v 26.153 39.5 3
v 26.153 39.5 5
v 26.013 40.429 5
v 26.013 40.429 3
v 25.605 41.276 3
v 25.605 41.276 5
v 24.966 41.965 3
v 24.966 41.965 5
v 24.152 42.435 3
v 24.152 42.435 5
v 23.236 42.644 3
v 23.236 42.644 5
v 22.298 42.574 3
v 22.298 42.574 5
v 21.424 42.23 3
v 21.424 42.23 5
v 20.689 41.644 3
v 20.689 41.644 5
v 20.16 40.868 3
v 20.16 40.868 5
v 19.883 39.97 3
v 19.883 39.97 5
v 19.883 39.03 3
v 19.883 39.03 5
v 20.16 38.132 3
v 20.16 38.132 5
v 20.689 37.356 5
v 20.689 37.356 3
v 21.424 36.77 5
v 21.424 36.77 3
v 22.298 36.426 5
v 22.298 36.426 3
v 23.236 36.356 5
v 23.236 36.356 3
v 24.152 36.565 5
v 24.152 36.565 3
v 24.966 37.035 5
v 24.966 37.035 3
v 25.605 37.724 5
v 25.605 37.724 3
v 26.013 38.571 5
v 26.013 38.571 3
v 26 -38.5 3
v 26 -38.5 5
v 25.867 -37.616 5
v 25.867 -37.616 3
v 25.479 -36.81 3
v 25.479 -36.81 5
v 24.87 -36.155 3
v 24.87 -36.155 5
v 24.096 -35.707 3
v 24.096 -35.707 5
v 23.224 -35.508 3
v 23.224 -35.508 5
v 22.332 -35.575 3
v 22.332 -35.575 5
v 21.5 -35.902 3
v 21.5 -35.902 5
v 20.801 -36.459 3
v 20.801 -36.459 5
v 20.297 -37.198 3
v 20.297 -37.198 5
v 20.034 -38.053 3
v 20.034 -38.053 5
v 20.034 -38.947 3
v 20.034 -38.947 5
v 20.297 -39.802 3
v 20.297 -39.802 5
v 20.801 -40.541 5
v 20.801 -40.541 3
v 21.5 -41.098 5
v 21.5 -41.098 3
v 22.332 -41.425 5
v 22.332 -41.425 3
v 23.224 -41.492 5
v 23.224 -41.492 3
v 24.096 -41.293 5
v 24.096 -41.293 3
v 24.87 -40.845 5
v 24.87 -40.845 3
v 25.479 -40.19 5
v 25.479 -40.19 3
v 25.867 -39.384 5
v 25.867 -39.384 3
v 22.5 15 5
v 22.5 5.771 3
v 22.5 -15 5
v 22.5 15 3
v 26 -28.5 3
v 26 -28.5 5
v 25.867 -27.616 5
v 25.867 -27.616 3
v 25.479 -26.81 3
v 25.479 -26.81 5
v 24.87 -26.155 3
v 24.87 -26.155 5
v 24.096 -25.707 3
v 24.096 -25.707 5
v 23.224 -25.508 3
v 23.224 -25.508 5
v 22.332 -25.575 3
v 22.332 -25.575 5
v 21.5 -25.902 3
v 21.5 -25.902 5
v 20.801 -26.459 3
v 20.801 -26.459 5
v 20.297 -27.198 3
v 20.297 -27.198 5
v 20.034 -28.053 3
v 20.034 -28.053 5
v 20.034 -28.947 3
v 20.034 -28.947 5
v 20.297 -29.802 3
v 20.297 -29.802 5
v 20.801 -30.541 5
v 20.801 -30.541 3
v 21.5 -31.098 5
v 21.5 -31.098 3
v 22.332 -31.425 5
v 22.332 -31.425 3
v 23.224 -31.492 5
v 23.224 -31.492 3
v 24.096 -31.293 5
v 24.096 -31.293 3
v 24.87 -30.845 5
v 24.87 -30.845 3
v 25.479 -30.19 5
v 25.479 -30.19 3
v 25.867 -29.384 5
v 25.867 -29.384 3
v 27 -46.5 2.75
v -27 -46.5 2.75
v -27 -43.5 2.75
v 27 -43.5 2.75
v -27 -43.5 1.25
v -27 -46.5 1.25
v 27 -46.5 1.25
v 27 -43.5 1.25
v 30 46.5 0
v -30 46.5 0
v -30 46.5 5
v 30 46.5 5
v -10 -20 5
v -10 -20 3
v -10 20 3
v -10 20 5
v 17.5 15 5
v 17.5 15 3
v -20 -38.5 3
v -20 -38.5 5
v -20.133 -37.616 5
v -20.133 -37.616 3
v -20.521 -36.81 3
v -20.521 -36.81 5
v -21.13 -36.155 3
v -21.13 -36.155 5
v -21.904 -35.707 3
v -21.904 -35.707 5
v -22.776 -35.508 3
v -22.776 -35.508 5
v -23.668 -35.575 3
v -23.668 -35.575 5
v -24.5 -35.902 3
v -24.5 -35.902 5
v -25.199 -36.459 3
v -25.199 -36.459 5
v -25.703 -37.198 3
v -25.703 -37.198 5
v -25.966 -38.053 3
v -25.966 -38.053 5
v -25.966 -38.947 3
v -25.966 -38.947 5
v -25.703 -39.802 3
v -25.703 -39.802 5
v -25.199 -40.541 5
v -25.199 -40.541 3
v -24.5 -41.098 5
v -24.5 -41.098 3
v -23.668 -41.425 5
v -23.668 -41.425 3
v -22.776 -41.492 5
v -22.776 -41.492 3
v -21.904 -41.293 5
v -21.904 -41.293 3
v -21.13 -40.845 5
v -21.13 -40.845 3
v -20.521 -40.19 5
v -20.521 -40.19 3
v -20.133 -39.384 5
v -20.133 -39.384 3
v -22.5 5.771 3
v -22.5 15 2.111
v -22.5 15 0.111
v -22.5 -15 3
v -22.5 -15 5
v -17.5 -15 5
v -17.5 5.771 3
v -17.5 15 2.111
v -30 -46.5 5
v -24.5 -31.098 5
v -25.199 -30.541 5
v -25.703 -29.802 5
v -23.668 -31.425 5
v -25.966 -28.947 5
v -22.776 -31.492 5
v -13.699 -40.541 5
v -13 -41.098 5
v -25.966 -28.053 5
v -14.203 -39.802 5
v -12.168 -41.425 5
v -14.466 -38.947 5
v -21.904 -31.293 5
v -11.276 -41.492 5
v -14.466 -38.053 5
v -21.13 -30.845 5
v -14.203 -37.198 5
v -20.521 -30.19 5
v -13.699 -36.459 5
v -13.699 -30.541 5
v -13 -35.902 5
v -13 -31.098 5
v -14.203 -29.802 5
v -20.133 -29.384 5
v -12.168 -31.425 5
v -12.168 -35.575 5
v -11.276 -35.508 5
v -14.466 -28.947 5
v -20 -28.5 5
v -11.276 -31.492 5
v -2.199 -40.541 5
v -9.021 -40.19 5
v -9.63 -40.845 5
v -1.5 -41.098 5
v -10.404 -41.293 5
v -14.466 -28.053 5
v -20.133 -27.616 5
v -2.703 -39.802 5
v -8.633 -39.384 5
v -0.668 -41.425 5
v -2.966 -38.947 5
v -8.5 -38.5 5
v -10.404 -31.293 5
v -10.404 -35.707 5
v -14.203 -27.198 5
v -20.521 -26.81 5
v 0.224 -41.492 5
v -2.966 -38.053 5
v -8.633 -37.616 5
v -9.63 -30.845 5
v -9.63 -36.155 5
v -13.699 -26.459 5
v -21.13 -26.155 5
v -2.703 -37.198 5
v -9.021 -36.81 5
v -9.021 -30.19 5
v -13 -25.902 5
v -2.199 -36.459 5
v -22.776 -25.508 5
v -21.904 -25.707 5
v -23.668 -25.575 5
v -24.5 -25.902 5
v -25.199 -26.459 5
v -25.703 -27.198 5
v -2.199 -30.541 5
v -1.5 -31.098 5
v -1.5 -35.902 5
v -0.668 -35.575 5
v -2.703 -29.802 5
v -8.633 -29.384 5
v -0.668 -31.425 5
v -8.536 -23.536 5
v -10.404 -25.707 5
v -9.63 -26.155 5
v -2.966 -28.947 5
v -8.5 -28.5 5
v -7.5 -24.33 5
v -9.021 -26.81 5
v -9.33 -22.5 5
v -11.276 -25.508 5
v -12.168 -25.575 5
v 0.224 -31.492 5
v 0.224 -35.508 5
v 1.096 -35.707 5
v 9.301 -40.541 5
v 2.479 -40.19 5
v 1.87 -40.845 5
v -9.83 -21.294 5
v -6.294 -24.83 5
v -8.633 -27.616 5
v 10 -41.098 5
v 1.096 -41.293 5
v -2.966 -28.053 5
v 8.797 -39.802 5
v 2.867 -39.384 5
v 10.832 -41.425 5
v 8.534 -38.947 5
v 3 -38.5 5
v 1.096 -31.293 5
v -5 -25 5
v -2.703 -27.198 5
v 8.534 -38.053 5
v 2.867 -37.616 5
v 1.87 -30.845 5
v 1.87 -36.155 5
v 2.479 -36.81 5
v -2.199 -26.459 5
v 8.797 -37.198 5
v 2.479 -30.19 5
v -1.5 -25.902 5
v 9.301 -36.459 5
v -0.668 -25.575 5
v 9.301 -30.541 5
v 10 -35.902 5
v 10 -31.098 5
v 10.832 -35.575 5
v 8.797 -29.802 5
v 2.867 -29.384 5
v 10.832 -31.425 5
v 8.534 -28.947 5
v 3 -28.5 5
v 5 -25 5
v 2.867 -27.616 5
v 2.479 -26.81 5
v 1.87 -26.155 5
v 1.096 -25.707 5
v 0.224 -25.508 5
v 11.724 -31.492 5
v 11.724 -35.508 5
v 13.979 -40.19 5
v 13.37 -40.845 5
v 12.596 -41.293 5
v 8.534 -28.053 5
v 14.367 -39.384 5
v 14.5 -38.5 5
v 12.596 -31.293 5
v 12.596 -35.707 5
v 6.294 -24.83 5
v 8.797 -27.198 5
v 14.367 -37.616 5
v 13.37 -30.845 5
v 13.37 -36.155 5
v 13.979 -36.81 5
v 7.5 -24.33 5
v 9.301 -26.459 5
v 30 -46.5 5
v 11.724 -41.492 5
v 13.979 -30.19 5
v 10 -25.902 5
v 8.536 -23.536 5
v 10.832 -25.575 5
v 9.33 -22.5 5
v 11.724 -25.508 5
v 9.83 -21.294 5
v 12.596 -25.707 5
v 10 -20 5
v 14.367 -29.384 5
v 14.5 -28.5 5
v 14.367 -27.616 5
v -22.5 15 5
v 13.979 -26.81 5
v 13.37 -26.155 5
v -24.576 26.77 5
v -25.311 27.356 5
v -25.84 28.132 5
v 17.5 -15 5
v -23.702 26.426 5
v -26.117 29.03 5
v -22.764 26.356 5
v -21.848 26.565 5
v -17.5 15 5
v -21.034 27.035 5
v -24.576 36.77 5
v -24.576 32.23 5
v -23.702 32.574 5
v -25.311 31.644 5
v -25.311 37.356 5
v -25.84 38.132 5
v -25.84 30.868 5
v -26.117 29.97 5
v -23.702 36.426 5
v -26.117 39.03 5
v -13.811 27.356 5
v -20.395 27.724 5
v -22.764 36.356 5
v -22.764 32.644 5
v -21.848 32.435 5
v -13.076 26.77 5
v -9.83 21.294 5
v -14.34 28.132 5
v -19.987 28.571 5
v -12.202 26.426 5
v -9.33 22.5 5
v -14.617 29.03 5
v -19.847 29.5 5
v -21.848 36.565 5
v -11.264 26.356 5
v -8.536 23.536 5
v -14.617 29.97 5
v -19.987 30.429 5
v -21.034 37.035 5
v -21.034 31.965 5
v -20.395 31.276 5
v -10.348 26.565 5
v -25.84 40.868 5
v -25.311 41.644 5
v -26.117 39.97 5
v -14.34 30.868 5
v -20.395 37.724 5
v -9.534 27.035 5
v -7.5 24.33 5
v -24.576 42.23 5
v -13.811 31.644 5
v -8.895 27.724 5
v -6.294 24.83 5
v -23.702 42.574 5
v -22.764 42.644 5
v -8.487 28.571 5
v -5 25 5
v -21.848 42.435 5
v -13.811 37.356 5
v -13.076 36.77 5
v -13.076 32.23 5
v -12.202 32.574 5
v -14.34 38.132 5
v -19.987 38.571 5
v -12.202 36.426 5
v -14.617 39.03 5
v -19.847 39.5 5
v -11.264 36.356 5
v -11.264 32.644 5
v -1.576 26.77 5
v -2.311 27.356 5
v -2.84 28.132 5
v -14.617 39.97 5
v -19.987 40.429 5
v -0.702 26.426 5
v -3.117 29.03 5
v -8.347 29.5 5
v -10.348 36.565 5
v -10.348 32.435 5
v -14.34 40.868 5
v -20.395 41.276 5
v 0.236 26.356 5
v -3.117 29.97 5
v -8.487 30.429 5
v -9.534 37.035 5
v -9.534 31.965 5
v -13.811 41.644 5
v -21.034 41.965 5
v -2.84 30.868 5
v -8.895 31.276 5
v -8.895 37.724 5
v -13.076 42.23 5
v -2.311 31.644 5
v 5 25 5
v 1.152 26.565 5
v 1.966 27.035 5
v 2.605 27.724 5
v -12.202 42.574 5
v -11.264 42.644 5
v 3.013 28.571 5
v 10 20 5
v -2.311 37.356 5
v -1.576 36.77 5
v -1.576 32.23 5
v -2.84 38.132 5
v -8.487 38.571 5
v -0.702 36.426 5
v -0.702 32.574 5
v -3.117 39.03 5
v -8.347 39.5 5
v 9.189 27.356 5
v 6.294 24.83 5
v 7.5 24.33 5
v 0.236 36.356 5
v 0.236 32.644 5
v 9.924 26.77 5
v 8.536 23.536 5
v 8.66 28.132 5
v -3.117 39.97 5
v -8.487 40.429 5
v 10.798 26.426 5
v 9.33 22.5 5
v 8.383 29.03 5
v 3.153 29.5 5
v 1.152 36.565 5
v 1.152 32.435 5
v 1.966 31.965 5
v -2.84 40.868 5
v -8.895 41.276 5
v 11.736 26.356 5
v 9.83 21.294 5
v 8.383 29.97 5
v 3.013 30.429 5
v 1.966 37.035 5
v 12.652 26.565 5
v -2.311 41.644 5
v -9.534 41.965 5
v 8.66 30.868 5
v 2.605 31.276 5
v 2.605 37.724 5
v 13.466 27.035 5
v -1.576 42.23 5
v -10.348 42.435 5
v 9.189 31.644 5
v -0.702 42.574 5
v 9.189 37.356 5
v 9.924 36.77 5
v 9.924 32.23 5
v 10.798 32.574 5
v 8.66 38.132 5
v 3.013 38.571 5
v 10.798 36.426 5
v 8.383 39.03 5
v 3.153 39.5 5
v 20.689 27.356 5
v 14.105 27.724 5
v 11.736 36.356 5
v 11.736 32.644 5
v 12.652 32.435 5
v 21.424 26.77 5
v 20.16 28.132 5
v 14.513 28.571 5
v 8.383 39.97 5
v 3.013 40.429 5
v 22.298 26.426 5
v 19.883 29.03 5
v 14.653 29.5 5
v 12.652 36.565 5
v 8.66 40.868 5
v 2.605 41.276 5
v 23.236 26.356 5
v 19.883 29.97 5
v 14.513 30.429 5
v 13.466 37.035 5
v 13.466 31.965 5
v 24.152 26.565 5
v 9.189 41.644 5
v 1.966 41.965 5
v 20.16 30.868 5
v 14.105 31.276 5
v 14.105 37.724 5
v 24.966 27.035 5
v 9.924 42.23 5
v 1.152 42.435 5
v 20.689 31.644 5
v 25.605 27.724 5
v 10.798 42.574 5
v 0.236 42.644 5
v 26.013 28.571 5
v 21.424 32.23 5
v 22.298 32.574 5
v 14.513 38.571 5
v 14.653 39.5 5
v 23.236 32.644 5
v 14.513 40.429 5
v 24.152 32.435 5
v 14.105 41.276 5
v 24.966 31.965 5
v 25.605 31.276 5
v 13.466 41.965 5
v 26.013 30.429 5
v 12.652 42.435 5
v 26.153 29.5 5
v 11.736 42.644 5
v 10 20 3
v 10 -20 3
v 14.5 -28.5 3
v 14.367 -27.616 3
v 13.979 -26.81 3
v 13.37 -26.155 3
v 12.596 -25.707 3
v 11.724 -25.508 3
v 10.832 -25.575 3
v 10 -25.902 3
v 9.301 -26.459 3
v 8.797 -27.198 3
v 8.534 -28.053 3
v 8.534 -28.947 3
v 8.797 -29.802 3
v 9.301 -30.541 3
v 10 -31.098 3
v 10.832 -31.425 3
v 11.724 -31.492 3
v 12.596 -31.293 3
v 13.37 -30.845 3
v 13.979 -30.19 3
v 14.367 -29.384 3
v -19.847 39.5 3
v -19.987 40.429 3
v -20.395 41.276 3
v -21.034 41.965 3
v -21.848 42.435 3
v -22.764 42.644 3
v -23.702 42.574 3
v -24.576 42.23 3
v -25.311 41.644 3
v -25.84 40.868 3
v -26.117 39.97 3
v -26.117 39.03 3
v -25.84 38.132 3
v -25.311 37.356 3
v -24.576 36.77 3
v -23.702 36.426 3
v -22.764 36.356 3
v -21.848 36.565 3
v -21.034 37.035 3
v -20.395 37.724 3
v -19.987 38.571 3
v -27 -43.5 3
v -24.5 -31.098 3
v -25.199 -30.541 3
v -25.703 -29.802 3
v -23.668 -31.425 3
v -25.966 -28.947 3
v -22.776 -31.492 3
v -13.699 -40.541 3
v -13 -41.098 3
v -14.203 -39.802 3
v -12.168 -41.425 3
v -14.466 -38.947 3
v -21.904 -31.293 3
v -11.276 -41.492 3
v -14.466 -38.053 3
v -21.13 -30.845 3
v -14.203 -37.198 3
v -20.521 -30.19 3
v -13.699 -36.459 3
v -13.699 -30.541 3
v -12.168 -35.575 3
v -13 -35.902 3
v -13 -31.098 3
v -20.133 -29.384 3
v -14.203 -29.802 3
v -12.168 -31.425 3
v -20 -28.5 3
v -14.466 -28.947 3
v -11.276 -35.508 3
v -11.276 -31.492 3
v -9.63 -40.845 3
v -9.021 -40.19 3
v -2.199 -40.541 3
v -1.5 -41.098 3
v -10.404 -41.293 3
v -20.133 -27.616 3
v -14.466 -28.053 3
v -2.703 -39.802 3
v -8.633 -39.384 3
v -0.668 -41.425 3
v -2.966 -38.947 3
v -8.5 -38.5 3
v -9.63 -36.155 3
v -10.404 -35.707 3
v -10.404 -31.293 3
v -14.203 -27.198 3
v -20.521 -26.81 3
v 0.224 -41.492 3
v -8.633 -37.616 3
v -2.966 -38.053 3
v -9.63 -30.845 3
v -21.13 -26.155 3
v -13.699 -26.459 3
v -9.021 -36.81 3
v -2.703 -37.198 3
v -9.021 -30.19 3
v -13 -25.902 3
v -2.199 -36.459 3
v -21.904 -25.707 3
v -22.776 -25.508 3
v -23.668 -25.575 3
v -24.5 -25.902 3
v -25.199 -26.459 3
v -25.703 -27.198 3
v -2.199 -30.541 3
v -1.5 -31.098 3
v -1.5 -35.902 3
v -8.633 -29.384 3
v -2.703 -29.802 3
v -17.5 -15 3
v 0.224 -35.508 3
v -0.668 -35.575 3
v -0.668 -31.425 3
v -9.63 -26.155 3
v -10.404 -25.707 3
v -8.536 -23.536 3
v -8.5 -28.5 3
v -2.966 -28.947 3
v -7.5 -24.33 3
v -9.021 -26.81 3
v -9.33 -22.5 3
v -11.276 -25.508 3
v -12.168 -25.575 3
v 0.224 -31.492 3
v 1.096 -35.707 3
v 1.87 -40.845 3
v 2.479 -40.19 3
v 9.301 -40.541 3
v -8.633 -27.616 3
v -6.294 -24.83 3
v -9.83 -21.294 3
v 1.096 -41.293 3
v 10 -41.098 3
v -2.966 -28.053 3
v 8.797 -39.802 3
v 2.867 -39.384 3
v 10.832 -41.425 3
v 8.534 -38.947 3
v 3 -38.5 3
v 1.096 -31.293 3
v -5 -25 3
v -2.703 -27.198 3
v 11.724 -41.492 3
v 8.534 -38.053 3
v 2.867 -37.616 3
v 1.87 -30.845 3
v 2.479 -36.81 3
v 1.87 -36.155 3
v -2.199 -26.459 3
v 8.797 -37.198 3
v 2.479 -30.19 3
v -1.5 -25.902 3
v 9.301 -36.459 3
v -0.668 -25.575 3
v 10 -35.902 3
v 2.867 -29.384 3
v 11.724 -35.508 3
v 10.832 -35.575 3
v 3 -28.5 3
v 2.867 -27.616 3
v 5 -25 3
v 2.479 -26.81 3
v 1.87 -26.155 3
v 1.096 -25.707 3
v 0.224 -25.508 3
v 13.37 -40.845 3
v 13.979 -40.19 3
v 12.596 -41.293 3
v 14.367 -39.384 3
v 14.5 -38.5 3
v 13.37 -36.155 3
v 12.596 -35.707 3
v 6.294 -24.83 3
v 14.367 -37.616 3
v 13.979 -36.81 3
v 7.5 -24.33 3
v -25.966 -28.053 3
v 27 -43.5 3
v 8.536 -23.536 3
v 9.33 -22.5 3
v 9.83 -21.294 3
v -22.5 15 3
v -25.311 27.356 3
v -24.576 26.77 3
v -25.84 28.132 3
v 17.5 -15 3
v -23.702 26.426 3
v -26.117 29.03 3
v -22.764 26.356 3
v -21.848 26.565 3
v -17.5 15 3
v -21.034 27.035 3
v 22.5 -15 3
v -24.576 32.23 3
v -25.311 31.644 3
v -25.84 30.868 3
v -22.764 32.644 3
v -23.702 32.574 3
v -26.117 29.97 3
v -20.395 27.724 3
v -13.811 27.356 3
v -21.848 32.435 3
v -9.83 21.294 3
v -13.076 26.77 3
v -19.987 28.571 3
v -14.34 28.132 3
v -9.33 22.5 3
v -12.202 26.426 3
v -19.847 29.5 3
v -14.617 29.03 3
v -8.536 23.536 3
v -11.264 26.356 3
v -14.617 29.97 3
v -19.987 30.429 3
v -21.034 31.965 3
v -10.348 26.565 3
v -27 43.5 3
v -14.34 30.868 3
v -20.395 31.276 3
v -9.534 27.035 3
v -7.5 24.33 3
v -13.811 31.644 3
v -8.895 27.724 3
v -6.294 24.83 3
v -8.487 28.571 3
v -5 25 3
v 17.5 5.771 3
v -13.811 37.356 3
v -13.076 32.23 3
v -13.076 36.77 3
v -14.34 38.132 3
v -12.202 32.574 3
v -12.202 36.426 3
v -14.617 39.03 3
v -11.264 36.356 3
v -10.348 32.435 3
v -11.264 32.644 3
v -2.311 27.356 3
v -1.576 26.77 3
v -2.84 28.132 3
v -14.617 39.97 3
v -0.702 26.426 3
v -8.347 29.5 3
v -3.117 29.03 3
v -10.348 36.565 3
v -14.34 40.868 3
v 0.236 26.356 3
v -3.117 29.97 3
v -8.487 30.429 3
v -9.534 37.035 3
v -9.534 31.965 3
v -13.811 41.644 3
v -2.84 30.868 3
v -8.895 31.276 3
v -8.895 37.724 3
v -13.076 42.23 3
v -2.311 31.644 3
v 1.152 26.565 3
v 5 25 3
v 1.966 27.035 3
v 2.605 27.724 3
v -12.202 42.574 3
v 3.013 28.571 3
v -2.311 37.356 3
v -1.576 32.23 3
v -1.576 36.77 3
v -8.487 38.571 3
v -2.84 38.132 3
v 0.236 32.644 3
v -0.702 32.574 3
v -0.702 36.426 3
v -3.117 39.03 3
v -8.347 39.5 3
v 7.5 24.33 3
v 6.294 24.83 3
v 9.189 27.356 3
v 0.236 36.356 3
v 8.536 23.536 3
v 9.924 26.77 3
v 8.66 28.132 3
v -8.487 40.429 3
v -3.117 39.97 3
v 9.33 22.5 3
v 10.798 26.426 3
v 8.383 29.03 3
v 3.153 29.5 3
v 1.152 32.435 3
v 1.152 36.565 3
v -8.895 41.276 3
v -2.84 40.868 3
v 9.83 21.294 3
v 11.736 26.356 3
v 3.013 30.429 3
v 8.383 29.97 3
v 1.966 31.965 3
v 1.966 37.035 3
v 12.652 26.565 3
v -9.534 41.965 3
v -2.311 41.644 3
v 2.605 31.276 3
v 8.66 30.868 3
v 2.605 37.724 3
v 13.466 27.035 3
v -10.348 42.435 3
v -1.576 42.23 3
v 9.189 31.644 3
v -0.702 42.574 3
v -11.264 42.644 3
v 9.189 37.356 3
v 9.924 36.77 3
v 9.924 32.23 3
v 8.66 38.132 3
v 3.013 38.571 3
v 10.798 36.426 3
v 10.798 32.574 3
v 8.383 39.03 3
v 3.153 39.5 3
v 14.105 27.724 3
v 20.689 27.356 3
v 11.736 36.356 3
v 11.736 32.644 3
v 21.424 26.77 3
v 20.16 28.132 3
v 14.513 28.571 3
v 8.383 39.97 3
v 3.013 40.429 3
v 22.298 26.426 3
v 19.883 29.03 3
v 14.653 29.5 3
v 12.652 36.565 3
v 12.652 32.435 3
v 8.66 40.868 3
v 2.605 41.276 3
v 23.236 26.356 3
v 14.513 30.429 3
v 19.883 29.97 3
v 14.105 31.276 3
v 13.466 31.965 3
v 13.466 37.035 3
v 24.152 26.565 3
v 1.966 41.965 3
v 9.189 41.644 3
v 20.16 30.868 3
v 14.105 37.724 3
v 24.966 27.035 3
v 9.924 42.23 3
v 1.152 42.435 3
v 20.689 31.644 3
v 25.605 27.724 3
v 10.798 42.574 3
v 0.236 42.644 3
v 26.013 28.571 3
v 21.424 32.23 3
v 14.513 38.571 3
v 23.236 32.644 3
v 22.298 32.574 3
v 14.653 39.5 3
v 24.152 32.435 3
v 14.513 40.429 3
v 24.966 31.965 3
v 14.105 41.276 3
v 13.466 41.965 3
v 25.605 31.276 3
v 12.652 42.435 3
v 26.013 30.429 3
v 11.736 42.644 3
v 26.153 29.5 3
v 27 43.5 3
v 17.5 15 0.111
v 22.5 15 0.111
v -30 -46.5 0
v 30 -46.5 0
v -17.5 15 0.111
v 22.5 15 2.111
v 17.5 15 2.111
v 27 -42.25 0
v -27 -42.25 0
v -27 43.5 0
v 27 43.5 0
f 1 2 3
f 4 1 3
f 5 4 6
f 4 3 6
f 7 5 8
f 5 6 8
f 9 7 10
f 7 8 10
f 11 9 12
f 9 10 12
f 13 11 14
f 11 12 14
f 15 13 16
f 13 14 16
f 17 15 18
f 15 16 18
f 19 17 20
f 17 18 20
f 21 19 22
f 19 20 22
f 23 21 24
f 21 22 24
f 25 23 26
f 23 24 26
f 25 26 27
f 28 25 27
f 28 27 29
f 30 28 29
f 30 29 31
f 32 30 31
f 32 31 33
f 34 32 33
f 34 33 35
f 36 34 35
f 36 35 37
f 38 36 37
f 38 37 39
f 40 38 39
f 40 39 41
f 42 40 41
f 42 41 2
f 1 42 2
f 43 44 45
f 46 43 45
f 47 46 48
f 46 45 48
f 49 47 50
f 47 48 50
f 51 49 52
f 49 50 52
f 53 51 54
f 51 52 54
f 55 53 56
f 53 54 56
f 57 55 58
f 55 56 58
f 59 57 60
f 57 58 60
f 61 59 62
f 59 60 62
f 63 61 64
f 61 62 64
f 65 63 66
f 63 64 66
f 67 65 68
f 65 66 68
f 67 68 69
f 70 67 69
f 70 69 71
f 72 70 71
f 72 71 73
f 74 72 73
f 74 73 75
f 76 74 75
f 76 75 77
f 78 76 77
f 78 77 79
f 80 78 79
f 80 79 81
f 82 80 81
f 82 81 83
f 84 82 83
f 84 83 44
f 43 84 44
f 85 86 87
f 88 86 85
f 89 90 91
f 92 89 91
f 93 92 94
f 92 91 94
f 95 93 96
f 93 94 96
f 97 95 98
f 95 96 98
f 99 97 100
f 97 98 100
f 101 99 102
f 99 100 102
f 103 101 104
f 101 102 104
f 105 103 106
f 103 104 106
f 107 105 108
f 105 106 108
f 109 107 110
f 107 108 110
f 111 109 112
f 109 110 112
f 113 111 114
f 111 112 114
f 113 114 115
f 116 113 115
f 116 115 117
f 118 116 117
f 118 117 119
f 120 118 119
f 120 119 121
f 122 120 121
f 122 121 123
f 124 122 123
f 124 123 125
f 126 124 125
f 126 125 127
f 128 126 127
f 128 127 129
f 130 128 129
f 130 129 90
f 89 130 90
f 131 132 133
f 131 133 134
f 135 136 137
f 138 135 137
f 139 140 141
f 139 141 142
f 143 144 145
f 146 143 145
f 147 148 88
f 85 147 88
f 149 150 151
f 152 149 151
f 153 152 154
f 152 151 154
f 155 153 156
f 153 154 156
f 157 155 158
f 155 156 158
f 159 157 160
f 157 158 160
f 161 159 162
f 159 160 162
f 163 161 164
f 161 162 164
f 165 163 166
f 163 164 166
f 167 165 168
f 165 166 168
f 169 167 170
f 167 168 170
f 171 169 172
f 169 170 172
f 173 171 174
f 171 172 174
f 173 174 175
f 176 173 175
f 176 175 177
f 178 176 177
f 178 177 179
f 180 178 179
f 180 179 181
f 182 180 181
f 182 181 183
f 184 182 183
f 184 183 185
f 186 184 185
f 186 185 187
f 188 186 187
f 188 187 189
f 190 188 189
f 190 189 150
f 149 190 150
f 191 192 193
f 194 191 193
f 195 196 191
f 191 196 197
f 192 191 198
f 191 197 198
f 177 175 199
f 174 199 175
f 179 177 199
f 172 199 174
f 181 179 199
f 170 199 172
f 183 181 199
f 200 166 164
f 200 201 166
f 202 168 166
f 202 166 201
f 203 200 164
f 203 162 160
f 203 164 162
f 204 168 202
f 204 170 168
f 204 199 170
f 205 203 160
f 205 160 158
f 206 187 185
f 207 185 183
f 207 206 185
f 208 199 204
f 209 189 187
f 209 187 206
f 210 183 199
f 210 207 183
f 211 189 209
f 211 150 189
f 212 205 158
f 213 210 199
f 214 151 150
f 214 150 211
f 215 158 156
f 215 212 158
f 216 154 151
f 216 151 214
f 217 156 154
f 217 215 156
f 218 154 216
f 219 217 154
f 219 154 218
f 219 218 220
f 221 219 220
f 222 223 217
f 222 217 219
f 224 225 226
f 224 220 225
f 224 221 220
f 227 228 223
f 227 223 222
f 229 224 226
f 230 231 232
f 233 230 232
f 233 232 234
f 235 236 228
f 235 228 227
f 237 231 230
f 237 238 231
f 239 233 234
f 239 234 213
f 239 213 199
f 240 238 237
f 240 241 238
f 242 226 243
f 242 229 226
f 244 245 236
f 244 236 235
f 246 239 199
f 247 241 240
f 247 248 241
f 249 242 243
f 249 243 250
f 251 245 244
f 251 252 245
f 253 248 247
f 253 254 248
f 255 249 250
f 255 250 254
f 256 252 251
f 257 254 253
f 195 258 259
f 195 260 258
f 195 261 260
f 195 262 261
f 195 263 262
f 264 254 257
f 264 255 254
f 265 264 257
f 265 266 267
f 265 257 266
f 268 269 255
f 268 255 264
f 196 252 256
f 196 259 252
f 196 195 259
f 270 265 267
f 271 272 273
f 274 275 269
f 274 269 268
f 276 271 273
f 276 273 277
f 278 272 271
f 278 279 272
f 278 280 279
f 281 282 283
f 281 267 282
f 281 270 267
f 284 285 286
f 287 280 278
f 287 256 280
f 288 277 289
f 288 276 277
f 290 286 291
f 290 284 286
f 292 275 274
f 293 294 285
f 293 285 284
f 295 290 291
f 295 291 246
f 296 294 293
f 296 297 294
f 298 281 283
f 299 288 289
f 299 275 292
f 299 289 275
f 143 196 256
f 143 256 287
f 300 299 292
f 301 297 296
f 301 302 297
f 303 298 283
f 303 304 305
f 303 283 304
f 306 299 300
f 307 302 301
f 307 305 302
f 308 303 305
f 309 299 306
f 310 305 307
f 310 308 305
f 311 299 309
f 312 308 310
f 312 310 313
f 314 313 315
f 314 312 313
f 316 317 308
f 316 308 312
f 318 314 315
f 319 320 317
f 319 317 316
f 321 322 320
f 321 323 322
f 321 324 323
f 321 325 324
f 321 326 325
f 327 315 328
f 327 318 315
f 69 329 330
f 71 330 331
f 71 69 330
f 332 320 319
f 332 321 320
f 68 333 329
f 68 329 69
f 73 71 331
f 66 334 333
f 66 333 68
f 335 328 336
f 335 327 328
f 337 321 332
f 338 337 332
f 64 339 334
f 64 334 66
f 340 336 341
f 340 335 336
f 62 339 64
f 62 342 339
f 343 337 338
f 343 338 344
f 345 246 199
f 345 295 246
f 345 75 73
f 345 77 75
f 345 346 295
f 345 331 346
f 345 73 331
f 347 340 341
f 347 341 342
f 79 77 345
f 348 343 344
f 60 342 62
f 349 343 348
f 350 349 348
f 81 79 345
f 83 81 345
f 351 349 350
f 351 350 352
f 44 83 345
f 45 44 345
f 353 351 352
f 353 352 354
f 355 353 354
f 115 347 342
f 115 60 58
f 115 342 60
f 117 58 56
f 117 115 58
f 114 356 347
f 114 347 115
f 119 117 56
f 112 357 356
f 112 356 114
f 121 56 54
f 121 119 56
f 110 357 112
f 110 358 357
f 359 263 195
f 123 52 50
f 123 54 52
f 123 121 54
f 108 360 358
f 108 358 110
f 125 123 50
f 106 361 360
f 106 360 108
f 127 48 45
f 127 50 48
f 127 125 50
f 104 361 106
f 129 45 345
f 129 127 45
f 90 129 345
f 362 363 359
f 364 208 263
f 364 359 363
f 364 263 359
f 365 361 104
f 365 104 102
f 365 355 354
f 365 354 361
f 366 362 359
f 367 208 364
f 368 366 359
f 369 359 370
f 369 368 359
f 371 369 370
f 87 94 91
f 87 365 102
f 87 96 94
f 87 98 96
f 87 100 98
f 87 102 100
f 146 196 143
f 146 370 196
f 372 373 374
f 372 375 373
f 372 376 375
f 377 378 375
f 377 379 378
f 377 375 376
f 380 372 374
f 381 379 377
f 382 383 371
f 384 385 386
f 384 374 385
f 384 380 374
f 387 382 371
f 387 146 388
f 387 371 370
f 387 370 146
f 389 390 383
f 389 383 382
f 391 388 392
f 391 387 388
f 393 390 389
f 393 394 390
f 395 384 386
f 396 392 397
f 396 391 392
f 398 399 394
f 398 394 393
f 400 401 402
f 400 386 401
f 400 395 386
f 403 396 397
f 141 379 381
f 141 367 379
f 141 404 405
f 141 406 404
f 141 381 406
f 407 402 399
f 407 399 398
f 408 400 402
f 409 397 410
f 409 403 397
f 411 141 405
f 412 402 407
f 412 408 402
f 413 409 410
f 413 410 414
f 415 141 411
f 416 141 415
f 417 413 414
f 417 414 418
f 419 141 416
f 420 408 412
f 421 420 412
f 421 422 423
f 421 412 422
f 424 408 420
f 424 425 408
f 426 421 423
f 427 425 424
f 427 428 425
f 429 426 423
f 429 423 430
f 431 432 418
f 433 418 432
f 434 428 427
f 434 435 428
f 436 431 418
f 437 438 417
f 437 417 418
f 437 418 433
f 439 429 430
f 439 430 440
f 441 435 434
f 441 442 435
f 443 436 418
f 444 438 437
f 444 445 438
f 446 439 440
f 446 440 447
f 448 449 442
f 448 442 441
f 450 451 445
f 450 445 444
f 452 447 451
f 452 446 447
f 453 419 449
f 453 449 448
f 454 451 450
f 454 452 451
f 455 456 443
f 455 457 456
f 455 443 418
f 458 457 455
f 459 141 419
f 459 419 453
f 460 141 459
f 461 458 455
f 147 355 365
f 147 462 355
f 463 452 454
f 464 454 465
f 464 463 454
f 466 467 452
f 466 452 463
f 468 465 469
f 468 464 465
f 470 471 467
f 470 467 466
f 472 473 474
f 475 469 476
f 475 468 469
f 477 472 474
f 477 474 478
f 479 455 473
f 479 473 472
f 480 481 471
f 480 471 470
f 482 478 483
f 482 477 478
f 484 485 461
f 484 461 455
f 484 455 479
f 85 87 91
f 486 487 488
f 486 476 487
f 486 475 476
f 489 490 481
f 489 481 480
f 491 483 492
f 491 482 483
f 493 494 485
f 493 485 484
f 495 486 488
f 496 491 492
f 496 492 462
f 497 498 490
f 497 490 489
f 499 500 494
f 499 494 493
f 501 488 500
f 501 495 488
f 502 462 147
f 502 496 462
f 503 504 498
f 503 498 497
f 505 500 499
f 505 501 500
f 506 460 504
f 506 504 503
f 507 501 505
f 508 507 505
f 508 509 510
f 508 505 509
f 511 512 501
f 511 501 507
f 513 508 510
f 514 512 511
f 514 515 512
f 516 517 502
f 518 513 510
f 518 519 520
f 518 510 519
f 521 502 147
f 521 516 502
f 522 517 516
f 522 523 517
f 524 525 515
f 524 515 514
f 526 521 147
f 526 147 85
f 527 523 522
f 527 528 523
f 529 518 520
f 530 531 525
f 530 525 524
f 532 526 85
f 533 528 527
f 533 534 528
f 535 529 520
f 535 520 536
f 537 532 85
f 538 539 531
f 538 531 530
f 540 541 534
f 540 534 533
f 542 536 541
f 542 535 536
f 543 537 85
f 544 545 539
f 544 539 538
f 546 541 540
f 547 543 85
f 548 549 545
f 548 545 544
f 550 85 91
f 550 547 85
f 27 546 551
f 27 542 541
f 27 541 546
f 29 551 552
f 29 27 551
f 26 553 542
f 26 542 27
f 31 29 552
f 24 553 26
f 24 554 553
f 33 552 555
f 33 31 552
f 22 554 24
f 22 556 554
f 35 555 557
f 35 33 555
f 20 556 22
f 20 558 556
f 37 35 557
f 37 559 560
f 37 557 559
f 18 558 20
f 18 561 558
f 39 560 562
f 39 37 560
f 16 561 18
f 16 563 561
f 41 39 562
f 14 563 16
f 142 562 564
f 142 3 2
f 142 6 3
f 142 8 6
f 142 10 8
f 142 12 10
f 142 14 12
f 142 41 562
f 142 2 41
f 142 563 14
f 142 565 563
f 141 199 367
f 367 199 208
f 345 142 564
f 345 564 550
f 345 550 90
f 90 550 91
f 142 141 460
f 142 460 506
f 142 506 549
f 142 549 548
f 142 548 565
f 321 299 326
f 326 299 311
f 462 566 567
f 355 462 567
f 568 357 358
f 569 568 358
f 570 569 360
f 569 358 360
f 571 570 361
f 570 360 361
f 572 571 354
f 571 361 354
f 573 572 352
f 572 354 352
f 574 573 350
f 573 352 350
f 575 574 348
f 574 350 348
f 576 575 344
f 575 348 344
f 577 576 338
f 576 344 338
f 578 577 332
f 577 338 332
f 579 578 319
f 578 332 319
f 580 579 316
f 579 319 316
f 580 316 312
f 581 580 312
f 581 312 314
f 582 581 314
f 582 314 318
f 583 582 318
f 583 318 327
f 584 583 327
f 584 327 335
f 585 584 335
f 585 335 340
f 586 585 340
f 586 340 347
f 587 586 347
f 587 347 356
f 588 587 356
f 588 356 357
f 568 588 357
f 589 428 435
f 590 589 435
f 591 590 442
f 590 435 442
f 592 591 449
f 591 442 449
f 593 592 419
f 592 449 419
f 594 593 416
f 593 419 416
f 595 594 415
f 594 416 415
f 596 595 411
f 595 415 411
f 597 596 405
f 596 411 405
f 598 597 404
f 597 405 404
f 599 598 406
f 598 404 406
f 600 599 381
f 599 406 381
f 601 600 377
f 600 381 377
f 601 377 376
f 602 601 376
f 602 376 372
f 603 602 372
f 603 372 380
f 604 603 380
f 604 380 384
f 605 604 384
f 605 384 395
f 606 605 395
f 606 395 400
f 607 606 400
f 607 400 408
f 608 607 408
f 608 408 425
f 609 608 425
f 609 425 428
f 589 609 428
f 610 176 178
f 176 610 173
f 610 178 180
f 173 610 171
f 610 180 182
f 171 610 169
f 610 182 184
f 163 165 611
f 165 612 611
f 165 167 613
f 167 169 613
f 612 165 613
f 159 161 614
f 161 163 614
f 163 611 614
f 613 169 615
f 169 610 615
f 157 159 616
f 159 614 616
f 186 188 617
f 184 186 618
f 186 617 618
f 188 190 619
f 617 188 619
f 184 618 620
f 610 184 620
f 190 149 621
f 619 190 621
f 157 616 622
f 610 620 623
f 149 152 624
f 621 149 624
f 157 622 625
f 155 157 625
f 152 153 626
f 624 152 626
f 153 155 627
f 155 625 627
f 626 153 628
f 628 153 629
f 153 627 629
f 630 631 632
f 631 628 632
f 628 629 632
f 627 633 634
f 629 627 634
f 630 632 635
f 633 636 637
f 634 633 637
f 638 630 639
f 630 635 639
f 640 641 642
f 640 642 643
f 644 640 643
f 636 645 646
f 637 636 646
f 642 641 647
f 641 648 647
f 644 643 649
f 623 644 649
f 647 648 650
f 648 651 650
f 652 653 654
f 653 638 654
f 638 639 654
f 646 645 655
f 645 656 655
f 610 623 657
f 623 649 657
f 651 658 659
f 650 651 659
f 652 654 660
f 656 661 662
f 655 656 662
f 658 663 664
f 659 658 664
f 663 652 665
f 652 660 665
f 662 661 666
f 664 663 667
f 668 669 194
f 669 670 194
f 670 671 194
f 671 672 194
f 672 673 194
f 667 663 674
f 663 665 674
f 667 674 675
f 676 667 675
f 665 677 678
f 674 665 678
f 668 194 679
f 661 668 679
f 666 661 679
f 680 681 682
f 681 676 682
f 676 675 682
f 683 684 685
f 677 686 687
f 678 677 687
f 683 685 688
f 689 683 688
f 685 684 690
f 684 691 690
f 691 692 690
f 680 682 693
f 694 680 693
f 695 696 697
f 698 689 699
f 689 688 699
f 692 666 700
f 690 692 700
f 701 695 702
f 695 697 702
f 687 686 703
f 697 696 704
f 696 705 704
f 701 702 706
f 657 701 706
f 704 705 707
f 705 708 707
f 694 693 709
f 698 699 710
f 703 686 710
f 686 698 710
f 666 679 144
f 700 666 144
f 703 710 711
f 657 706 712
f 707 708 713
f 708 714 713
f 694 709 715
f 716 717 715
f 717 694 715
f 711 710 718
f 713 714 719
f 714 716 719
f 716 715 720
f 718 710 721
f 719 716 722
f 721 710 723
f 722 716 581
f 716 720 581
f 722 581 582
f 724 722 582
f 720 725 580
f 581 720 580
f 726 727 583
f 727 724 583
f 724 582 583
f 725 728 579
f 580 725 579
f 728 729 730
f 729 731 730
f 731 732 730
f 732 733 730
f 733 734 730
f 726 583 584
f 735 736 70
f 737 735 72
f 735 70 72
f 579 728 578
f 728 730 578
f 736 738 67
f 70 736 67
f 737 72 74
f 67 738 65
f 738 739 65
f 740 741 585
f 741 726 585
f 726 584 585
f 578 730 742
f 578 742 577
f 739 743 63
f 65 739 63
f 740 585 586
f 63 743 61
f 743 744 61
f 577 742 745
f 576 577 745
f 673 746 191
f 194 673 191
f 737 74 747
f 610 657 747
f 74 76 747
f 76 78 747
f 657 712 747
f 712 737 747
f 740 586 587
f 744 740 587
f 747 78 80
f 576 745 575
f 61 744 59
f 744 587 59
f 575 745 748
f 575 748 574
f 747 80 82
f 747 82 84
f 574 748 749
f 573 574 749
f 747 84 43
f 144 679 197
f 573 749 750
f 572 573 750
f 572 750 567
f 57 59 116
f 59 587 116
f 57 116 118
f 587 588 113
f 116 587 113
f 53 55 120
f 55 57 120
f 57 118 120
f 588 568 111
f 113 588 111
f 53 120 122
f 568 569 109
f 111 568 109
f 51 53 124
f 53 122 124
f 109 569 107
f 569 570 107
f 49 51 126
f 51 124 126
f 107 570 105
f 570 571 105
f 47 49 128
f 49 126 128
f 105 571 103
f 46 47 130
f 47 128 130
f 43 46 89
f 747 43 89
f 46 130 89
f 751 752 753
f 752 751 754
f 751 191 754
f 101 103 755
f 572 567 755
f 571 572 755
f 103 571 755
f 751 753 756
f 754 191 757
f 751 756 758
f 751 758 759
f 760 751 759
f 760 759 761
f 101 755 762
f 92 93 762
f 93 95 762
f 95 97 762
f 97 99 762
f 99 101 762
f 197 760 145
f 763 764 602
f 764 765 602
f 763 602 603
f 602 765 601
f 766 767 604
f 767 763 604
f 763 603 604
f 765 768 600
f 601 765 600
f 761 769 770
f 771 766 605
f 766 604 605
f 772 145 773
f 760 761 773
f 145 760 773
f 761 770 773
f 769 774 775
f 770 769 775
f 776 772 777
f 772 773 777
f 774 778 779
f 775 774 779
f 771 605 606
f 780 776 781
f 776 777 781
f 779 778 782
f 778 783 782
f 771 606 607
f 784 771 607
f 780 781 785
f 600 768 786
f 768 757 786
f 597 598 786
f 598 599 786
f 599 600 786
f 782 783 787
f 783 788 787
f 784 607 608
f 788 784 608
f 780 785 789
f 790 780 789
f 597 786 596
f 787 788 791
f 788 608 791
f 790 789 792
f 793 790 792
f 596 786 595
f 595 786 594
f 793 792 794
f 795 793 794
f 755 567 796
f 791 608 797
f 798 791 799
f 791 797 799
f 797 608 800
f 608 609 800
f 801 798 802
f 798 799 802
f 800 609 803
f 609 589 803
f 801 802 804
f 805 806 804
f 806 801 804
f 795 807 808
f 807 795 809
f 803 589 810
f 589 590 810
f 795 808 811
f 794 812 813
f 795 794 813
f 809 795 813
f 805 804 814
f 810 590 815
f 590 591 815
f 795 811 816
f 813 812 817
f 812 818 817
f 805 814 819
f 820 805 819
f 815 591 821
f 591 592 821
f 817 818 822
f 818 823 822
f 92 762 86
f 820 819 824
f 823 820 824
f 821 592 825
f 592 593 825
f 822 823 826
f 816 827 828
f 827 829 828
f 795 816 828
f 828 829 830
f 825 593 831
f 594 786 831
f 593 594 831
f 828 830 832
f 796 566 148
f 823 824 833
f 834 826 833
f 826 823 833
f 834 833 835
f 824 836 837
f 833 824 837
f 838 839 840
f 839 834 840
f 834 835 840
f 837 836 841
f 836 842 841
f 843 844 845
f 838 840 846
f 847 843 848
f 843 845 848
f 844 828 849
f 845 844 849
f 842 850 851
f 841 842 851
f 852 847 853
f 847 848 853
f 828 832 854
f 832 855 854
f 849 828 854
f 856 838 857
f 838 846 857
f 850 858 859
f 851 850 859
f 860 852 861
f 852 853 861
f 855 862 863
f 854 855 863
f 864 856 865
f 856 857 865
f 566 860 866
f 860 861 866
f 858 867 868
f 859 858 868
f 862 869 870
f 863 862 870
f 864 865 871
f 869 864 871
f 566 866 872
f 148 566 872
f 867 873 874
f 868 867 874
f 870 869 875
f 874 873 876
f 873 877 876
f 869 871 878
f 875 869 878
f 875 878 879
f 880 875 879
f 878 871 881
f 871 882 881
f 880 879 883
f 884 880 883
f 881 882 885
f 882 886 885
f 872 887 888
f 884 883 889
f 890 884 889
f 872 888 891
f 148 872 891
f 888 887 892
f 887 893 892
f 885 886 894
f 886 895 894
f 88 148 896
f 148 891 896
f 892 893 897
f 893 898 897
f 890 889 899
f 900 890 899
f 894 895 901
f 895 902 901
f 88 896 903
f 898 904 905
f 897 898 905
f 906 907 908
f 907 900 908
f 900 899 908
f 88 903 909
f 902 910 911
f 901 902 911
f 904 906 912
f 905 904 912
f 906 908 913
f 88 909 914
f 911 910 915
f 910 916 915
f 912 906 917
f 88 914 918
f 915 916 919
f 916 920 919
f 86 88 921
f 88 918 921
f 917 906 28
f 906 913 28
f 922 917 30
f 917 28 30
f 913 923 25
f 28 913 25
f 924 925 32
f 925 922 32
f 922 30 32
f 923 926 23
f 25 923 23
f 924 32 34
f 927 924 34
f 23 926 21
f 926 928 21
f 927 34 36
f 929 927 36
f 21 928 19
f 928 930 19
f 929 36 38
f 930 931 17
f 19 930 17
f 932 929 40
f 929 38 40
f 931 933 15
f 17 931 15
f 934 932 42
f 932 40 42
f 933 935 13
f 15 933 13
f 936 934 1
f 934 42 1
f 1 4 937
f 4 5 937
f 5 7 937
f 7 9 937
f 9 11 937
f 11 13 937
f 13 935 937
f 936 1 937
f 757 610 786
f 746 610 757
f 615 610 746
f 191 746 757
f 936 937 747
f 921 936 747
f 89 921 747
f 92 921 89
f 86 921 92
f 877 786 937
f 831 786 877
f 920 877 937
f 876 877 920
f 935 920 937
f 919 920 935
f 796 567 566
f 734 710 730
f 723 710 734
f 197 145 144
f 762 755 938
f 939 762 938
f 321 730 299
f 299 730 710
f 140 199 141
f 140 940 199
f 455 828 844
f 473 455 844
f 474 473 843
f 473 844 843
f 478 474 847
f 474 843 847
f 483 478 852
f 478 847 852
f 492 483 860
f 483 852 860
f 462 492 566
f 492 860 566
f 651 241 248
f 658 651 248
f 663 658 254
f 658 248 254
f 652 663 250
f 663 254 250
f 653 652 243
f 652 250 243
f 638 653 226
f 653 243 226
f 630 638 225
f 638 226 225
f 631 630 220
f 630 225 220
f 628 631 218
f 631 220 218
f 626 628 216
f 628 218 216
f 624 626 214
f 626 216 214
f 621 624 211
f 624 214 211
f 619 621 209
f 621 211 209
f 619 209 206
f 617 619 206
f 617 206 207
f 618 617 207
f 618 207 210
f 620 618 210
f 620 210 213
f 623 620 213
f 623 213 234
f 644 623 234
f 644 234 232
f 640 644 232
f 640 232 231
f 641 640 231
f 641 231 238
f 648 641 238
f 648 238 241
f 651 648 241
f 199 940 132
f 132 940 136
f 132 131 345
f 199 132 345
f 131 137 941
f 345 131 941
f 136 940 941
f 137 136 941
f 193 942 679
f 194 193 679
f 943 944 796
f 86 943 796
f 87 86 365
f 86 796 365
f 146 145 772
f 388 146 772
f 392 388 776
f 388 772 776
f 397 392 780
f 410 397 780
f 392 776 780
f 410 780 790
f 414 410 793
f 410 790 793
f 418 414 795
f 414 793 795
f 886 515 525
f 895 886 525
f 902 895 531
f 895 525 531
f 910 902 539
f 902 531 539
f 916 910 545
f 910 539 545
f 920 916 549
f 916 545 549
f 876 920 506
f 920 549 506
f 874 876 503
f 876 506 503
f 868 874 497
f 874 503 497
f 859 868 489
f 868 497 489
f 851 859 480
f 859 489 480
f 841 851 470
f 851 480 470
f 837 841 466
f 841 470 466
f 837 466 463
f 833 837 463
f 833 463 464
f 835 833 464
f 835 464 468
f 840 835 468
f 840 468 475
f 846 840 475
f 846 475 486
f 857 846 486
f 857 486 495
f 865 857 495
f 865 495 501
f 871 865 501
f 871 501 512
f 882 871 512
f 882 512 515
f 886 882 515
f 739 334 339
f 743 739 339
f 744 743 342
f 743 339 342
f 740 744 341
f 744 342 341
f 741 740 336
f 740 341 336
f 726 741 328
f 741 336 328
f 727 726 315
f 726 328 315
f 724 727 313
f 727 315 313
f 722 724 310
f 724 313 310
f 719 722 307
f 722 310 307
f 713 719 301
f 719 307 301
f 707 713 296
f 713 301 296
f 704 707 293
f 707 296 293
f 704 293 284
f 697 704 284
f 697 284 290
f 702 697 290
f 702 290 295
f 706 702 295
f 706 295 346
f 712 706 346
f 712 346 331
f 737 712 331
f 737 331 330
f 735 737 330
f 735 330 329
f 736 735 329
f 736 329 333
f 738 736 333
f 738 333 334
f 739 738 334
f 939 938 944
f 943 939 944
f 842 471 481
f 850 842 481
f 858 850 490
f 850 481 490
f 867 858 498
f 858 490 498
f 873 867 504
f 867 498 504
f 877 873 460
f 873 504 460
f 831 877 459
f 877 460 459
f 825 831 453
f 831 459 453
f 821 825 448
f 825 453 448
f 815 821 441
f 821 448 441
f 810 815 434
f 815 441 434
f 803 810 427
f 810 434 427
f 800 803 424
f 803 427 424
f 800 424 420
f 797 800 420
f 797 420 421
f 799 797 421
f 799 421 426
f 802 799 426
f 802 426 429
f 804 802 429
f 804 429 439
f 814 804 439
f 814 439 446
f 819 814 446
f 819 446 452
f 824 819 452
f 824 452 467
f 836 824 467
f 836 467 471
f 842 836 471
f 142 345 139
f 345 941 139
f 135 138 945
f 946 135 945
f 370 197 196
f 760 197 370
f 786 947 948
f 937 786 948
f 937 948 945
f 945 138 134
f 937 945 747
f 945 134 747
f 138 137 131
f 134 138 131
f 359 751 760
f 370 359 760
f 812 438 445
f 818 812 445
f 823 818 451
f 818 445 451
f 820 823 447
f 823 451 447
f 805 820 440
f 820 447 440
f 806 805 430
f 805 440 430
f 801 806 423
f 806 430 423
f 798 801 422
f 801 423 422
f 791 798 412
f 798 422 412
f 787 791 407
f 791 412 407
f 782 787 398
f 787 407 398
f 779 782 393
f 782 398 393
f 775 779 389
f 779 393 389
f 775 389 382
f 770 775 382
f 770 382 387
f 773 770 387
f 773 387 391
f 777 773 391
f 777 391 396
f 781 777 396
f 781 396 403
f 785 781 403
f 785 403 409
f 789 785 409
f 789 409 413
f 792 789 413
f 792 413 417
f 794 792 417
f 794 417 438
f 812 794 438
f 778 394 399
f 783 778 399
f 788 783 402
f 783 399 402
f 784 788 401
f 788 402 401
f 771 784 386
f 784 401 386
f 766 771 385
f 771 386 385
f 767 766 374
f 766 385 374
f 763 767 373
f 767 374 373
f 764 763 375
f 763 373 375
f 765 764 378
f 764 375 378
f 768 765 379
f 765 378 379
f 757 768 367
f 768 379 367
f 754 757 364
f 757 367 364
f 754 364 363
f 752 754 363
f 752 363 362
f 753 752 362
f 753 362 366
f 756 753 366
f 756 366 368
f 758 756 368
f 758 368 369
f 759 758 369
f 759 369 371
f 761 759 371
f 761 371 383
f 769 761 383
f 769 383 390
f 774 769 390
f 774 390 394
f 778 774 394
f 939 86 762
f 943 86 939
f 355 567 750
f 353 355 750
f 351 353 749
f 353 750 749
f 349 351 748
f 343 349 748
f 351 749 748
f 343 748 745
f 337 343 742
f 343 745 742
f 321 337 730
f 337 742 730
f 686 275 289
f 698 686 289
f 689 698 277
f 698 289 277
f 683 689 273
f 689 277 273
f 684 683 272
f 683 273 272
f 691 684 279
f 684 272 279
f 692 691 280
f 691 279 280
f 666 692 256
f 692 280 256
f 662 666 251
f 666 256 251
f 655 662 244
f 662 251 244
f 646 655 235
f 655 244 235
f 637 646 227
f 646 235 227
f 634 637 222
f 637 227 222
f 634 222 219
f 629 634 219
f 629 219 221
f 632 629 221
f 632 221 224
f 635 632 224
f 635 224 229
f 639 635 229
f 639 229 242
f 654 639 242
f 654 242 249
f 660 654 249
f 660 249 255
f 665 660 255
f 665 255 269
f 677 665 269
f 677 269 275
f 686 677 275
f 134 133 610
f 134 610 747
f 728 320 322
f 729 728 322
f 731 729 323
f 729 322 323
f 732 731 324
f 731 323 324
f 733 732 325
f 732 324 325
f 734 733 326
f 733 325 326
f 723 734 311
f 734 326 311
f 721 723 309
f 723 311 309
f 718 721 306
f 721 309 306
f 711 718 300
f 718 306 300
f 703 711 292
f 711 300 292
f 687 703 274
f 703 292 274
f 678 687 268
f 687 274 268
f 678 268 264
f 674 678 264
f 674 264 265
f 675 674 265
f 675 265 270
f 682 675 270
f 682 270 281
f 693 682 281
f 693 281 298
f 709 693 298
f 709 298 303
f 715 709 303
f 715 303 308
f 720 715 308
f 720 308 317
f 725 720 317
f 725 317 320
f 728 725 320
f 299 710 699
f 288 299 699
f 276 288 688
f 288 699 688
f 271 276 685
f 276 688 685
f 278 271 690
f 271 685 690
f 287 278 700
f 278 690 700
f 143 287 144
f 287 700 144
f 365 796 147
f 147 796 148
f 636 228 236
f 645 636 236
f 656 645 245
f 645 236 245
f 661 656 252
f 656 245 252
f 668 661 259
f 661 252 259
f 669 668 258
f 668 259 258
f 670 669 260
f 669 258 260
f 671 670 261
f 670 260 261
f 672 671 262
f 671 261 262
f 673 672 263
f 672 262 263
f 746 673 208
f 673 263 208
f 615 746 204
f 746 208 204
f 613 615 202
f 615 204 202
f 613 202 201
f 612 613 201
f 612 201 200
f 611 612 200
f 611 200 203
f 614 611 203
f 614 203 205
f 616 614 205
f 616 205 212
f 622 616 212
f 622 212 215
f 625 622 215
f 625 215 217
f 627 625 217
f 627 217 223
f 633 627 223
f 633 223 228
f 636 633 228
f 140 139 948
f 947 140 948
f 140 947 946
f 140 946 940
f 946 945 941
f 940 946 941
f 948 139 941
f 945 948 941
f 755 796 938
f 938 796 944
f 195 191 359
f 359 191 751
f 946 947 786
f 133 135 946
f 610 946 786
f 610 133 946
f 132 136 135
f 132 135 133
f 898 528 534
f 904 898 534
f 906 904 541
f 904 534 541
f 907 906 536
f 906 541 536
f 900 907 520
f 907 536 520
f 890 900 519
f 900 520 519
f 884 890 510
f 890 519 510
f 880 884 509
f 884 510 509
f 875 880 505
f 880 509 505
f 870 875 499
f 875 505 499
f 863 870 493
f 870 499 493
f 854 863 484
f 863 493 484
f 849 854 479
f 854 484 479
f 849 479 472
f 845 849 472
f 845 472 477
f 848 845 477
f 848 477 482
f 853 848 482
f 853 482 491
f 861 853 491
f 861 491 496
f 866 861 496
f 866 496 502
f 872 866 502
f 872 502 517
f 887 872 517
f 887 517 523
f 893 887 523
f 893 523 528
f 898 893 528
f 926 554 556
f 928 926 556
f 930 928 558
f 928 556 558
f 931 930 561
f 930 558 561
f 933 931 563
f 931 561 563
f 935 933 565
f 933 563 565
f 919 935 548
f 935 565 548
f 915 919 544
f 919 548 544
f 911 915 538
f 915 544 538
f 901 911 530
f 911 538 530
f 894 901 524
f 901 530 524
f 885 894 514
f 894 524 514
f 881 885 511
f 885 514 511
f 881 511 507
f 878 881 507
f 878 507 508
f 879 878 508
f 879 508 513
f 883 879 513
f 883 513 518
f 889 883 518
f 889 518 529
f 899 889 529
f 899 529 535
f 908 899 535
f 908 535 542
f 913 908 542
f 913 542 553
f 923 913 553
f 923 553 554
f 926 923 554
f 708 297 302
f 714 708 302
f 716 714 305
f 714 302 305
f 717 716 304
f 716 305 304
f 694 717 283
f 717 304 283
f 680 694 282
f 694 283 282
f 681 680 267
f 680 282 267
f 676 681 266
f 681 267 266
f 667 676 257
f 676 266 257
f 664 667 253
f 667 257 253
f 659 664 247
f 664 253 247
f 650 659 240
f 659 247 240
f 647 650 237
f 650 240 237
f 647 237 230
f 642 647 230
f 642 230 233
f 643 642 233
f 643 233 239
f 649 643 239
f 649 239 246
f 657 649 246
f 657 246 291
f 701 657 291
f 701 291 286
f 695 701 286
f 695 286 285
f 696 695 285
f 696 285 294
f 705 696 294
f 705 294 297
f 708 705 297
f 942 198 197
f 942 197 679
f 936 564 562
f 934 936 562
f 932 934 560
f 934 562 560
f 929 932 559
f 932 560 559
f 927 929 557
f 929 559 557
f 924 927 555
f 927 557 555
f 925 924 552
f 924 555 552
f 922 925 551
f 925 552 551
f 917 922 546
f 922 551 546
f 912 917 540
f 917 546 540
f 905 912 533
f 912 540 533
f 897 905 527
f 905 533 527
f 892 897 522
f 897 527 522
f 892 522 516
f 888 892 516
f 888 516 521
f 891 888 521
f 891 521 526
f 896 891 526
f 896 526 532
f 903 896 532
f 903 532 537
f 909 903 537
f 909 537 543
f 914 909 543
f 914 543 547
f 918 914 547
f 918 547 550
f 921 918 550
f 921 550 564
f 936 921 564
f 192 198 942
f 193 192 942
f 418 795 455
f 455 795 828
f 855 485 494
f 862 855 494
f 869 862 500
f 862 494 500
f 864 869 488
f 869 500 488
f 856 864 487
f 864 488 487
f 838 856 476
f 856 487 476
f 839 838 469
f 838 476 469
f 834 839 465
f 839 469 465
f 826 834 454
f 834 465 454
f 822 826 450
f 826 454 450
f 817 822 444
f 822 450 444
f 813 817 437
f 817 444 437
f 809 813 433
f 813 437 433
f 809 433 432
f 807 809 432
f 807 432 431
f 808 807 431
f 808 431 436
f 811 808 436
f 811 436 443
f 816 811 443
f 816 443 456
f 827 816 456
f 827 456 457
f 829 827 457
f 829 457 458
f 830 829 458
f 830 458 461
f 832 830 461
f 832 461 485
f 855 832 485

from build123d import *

# Parameters (mm, degrees)
F0_W      = 60
F0_H      = 93
F0_W_2    = 54
F0_H_2    = 87
F1_DEPTH  = 3
F2_W      = 60
F2_H      = 93
F2_W_2    = 5
F2_H_2    = 30
F3_DEPTH  = 2
F5_DEPTH  = 5
F7_DEPTH  = 5
F8_W      = 54
F8_H      = 1.5
F9_DEPTH  = 5
F11_DEPTH = 54
F12_R     = 3.152698
F12_R_2   = 3
F13_DEPTH = 25


with BuildPart() as f1:
    # F0 (on Top) → F1 (new body)
    with BuildSketch(Plane.XY):
        Rectangle(F0_W, F0_H)
        Rectangle(F0_W_2, F0_H_2, mode=Mode.SUBTRACT)
    extrude(amount=F1_DEPTH)

    # F2 (on face) → F3 (join)
    with BuildSketch(Plane.XY.offset(3)):
        Rectangle(F2_W, F2_H)
        with Locations((-20, 0)):
            Rectangle(F2_W_2, F2_H_2, mode=Mode.SUBTRACT)
        with BuildLine():
            Line((-5, 25), (5, 25))
            ThreePointArc((5, 25), (8.535534, 23.535534), (10, 20))
            Line((10, 20), (10, -20))
            ThreePointArc((10, -20), (8.535534, -23.535534), (5, -25))
            Line((5, -25), (-5, -25))
            ThreePointArc((-5, -25), (-8.535534, -23.535534), (-10, -20))
            Line((-10, -20), (-10, 20))
            ThreePointArc((-10, 20), (-8.535534, 23.535534), (-5, 25))
        make_face(mode=Mode.SUBTRACT)
        with Locations((20, 0)):
            Rectangle(F2_W_2, F2_H_2, mode=Mode.SUBTRACT)
    extrude(amount=F3_DEPTH)

    # F4 (on face) → F5 (join)
    with BuildSketch(Plane(origin=(-17.5, 0, 0), x_dir=(0, -1, 0), z_dir=(-1, 0, 0))):
        Polygon((15, 3), (15, 5), (-15, 2.111329), (-15, 0.111329), align=None)
    extrude(amount=F5_DEPTH)

    # F6 (on face) → F7 (join)
    with BuildSketch(Plane.YZ.offset(17.5)):
        Polygon((15, 2.111329), (-15, 5), (-15, 3), (15, 0.111329), align=None)
    extrude(amount=F7_DEPTH)

    # F8 (on face) → F9 (cut)
    with BuildSketch(Plane.XZ.offset(46.5)):
        with Locations((0, 2)):
            Rectangle(F8_W, F8_H)
    extrude(amount=-F9_DEPTH, mode=Mode.SUBTRACT)

    # F10 (on face) → F11 (join, through all)
    with BuildSketch(Plane(origin=(27, 0, 0), x_dir=(0, -1, 0), z_dir=(-1, 0, 0))):
        Polygon((43.5, 0), (43.5, 1.25), (42.25, 0), align=None)
    extrude(amount=F11_DEPTH)

    # F12 (on face) → F13 (cut)
    with BuildSketch(Plane.XY.offset(5)):
        with Locations((-23, 39.5)):
            Circle(F12_R)
        with Locations((-23, 29.5)):
            Circle(F12_R)
        with Locations((-11.5, 39.5)):
            Circle(F12_R)
        with Locations((-11.5, 29.5)):
            Circle(F12_R)
        with Locations((0, 39.5)):
            Circle(F12_R)
        with Locations((0, 29.5)):
            Circle(F12_R)
        with Locations((11.5, 39.5)):
            Circle(F12_R)
        with Locations((11.5, 29.5)):
            Circle(F12_R)
        with Locations((23, 39.5)):
            Circle(F12_R)
        with Locations((23, 29.5)):
            Circle(F12_R)
        with Locations((-23, -38.5)):
            Circle(F12_R_2)
        with Locations((-23, -28.5)):
            Circle(F12_R_2)
        with Locations((-11.5, -38.5)):
            Circle(F12_R_2)
        with Locations((-11.5, -28.5)):
            Circle(F12_R_2)
        with Locations((0, -38.5)):
            Circle(F12_R_2)
        with Locations((0, -28.5)):
            Circle(F12_R_2)
        with Locations((11.5, -38.5)):
            Circle(F12_R_2)
        with Locations((11.5, -28.5)):
            Circle(F12_R_2)
        with Locations((23, -38.5)):
            Circle(F12_R_2)
        with Locations((23, -28.5)):
            Circle(F12_R_2)
    extrude(amount=-F13_DEPTH, mode=Mode.SUBTRACT)


solid = f1.part
